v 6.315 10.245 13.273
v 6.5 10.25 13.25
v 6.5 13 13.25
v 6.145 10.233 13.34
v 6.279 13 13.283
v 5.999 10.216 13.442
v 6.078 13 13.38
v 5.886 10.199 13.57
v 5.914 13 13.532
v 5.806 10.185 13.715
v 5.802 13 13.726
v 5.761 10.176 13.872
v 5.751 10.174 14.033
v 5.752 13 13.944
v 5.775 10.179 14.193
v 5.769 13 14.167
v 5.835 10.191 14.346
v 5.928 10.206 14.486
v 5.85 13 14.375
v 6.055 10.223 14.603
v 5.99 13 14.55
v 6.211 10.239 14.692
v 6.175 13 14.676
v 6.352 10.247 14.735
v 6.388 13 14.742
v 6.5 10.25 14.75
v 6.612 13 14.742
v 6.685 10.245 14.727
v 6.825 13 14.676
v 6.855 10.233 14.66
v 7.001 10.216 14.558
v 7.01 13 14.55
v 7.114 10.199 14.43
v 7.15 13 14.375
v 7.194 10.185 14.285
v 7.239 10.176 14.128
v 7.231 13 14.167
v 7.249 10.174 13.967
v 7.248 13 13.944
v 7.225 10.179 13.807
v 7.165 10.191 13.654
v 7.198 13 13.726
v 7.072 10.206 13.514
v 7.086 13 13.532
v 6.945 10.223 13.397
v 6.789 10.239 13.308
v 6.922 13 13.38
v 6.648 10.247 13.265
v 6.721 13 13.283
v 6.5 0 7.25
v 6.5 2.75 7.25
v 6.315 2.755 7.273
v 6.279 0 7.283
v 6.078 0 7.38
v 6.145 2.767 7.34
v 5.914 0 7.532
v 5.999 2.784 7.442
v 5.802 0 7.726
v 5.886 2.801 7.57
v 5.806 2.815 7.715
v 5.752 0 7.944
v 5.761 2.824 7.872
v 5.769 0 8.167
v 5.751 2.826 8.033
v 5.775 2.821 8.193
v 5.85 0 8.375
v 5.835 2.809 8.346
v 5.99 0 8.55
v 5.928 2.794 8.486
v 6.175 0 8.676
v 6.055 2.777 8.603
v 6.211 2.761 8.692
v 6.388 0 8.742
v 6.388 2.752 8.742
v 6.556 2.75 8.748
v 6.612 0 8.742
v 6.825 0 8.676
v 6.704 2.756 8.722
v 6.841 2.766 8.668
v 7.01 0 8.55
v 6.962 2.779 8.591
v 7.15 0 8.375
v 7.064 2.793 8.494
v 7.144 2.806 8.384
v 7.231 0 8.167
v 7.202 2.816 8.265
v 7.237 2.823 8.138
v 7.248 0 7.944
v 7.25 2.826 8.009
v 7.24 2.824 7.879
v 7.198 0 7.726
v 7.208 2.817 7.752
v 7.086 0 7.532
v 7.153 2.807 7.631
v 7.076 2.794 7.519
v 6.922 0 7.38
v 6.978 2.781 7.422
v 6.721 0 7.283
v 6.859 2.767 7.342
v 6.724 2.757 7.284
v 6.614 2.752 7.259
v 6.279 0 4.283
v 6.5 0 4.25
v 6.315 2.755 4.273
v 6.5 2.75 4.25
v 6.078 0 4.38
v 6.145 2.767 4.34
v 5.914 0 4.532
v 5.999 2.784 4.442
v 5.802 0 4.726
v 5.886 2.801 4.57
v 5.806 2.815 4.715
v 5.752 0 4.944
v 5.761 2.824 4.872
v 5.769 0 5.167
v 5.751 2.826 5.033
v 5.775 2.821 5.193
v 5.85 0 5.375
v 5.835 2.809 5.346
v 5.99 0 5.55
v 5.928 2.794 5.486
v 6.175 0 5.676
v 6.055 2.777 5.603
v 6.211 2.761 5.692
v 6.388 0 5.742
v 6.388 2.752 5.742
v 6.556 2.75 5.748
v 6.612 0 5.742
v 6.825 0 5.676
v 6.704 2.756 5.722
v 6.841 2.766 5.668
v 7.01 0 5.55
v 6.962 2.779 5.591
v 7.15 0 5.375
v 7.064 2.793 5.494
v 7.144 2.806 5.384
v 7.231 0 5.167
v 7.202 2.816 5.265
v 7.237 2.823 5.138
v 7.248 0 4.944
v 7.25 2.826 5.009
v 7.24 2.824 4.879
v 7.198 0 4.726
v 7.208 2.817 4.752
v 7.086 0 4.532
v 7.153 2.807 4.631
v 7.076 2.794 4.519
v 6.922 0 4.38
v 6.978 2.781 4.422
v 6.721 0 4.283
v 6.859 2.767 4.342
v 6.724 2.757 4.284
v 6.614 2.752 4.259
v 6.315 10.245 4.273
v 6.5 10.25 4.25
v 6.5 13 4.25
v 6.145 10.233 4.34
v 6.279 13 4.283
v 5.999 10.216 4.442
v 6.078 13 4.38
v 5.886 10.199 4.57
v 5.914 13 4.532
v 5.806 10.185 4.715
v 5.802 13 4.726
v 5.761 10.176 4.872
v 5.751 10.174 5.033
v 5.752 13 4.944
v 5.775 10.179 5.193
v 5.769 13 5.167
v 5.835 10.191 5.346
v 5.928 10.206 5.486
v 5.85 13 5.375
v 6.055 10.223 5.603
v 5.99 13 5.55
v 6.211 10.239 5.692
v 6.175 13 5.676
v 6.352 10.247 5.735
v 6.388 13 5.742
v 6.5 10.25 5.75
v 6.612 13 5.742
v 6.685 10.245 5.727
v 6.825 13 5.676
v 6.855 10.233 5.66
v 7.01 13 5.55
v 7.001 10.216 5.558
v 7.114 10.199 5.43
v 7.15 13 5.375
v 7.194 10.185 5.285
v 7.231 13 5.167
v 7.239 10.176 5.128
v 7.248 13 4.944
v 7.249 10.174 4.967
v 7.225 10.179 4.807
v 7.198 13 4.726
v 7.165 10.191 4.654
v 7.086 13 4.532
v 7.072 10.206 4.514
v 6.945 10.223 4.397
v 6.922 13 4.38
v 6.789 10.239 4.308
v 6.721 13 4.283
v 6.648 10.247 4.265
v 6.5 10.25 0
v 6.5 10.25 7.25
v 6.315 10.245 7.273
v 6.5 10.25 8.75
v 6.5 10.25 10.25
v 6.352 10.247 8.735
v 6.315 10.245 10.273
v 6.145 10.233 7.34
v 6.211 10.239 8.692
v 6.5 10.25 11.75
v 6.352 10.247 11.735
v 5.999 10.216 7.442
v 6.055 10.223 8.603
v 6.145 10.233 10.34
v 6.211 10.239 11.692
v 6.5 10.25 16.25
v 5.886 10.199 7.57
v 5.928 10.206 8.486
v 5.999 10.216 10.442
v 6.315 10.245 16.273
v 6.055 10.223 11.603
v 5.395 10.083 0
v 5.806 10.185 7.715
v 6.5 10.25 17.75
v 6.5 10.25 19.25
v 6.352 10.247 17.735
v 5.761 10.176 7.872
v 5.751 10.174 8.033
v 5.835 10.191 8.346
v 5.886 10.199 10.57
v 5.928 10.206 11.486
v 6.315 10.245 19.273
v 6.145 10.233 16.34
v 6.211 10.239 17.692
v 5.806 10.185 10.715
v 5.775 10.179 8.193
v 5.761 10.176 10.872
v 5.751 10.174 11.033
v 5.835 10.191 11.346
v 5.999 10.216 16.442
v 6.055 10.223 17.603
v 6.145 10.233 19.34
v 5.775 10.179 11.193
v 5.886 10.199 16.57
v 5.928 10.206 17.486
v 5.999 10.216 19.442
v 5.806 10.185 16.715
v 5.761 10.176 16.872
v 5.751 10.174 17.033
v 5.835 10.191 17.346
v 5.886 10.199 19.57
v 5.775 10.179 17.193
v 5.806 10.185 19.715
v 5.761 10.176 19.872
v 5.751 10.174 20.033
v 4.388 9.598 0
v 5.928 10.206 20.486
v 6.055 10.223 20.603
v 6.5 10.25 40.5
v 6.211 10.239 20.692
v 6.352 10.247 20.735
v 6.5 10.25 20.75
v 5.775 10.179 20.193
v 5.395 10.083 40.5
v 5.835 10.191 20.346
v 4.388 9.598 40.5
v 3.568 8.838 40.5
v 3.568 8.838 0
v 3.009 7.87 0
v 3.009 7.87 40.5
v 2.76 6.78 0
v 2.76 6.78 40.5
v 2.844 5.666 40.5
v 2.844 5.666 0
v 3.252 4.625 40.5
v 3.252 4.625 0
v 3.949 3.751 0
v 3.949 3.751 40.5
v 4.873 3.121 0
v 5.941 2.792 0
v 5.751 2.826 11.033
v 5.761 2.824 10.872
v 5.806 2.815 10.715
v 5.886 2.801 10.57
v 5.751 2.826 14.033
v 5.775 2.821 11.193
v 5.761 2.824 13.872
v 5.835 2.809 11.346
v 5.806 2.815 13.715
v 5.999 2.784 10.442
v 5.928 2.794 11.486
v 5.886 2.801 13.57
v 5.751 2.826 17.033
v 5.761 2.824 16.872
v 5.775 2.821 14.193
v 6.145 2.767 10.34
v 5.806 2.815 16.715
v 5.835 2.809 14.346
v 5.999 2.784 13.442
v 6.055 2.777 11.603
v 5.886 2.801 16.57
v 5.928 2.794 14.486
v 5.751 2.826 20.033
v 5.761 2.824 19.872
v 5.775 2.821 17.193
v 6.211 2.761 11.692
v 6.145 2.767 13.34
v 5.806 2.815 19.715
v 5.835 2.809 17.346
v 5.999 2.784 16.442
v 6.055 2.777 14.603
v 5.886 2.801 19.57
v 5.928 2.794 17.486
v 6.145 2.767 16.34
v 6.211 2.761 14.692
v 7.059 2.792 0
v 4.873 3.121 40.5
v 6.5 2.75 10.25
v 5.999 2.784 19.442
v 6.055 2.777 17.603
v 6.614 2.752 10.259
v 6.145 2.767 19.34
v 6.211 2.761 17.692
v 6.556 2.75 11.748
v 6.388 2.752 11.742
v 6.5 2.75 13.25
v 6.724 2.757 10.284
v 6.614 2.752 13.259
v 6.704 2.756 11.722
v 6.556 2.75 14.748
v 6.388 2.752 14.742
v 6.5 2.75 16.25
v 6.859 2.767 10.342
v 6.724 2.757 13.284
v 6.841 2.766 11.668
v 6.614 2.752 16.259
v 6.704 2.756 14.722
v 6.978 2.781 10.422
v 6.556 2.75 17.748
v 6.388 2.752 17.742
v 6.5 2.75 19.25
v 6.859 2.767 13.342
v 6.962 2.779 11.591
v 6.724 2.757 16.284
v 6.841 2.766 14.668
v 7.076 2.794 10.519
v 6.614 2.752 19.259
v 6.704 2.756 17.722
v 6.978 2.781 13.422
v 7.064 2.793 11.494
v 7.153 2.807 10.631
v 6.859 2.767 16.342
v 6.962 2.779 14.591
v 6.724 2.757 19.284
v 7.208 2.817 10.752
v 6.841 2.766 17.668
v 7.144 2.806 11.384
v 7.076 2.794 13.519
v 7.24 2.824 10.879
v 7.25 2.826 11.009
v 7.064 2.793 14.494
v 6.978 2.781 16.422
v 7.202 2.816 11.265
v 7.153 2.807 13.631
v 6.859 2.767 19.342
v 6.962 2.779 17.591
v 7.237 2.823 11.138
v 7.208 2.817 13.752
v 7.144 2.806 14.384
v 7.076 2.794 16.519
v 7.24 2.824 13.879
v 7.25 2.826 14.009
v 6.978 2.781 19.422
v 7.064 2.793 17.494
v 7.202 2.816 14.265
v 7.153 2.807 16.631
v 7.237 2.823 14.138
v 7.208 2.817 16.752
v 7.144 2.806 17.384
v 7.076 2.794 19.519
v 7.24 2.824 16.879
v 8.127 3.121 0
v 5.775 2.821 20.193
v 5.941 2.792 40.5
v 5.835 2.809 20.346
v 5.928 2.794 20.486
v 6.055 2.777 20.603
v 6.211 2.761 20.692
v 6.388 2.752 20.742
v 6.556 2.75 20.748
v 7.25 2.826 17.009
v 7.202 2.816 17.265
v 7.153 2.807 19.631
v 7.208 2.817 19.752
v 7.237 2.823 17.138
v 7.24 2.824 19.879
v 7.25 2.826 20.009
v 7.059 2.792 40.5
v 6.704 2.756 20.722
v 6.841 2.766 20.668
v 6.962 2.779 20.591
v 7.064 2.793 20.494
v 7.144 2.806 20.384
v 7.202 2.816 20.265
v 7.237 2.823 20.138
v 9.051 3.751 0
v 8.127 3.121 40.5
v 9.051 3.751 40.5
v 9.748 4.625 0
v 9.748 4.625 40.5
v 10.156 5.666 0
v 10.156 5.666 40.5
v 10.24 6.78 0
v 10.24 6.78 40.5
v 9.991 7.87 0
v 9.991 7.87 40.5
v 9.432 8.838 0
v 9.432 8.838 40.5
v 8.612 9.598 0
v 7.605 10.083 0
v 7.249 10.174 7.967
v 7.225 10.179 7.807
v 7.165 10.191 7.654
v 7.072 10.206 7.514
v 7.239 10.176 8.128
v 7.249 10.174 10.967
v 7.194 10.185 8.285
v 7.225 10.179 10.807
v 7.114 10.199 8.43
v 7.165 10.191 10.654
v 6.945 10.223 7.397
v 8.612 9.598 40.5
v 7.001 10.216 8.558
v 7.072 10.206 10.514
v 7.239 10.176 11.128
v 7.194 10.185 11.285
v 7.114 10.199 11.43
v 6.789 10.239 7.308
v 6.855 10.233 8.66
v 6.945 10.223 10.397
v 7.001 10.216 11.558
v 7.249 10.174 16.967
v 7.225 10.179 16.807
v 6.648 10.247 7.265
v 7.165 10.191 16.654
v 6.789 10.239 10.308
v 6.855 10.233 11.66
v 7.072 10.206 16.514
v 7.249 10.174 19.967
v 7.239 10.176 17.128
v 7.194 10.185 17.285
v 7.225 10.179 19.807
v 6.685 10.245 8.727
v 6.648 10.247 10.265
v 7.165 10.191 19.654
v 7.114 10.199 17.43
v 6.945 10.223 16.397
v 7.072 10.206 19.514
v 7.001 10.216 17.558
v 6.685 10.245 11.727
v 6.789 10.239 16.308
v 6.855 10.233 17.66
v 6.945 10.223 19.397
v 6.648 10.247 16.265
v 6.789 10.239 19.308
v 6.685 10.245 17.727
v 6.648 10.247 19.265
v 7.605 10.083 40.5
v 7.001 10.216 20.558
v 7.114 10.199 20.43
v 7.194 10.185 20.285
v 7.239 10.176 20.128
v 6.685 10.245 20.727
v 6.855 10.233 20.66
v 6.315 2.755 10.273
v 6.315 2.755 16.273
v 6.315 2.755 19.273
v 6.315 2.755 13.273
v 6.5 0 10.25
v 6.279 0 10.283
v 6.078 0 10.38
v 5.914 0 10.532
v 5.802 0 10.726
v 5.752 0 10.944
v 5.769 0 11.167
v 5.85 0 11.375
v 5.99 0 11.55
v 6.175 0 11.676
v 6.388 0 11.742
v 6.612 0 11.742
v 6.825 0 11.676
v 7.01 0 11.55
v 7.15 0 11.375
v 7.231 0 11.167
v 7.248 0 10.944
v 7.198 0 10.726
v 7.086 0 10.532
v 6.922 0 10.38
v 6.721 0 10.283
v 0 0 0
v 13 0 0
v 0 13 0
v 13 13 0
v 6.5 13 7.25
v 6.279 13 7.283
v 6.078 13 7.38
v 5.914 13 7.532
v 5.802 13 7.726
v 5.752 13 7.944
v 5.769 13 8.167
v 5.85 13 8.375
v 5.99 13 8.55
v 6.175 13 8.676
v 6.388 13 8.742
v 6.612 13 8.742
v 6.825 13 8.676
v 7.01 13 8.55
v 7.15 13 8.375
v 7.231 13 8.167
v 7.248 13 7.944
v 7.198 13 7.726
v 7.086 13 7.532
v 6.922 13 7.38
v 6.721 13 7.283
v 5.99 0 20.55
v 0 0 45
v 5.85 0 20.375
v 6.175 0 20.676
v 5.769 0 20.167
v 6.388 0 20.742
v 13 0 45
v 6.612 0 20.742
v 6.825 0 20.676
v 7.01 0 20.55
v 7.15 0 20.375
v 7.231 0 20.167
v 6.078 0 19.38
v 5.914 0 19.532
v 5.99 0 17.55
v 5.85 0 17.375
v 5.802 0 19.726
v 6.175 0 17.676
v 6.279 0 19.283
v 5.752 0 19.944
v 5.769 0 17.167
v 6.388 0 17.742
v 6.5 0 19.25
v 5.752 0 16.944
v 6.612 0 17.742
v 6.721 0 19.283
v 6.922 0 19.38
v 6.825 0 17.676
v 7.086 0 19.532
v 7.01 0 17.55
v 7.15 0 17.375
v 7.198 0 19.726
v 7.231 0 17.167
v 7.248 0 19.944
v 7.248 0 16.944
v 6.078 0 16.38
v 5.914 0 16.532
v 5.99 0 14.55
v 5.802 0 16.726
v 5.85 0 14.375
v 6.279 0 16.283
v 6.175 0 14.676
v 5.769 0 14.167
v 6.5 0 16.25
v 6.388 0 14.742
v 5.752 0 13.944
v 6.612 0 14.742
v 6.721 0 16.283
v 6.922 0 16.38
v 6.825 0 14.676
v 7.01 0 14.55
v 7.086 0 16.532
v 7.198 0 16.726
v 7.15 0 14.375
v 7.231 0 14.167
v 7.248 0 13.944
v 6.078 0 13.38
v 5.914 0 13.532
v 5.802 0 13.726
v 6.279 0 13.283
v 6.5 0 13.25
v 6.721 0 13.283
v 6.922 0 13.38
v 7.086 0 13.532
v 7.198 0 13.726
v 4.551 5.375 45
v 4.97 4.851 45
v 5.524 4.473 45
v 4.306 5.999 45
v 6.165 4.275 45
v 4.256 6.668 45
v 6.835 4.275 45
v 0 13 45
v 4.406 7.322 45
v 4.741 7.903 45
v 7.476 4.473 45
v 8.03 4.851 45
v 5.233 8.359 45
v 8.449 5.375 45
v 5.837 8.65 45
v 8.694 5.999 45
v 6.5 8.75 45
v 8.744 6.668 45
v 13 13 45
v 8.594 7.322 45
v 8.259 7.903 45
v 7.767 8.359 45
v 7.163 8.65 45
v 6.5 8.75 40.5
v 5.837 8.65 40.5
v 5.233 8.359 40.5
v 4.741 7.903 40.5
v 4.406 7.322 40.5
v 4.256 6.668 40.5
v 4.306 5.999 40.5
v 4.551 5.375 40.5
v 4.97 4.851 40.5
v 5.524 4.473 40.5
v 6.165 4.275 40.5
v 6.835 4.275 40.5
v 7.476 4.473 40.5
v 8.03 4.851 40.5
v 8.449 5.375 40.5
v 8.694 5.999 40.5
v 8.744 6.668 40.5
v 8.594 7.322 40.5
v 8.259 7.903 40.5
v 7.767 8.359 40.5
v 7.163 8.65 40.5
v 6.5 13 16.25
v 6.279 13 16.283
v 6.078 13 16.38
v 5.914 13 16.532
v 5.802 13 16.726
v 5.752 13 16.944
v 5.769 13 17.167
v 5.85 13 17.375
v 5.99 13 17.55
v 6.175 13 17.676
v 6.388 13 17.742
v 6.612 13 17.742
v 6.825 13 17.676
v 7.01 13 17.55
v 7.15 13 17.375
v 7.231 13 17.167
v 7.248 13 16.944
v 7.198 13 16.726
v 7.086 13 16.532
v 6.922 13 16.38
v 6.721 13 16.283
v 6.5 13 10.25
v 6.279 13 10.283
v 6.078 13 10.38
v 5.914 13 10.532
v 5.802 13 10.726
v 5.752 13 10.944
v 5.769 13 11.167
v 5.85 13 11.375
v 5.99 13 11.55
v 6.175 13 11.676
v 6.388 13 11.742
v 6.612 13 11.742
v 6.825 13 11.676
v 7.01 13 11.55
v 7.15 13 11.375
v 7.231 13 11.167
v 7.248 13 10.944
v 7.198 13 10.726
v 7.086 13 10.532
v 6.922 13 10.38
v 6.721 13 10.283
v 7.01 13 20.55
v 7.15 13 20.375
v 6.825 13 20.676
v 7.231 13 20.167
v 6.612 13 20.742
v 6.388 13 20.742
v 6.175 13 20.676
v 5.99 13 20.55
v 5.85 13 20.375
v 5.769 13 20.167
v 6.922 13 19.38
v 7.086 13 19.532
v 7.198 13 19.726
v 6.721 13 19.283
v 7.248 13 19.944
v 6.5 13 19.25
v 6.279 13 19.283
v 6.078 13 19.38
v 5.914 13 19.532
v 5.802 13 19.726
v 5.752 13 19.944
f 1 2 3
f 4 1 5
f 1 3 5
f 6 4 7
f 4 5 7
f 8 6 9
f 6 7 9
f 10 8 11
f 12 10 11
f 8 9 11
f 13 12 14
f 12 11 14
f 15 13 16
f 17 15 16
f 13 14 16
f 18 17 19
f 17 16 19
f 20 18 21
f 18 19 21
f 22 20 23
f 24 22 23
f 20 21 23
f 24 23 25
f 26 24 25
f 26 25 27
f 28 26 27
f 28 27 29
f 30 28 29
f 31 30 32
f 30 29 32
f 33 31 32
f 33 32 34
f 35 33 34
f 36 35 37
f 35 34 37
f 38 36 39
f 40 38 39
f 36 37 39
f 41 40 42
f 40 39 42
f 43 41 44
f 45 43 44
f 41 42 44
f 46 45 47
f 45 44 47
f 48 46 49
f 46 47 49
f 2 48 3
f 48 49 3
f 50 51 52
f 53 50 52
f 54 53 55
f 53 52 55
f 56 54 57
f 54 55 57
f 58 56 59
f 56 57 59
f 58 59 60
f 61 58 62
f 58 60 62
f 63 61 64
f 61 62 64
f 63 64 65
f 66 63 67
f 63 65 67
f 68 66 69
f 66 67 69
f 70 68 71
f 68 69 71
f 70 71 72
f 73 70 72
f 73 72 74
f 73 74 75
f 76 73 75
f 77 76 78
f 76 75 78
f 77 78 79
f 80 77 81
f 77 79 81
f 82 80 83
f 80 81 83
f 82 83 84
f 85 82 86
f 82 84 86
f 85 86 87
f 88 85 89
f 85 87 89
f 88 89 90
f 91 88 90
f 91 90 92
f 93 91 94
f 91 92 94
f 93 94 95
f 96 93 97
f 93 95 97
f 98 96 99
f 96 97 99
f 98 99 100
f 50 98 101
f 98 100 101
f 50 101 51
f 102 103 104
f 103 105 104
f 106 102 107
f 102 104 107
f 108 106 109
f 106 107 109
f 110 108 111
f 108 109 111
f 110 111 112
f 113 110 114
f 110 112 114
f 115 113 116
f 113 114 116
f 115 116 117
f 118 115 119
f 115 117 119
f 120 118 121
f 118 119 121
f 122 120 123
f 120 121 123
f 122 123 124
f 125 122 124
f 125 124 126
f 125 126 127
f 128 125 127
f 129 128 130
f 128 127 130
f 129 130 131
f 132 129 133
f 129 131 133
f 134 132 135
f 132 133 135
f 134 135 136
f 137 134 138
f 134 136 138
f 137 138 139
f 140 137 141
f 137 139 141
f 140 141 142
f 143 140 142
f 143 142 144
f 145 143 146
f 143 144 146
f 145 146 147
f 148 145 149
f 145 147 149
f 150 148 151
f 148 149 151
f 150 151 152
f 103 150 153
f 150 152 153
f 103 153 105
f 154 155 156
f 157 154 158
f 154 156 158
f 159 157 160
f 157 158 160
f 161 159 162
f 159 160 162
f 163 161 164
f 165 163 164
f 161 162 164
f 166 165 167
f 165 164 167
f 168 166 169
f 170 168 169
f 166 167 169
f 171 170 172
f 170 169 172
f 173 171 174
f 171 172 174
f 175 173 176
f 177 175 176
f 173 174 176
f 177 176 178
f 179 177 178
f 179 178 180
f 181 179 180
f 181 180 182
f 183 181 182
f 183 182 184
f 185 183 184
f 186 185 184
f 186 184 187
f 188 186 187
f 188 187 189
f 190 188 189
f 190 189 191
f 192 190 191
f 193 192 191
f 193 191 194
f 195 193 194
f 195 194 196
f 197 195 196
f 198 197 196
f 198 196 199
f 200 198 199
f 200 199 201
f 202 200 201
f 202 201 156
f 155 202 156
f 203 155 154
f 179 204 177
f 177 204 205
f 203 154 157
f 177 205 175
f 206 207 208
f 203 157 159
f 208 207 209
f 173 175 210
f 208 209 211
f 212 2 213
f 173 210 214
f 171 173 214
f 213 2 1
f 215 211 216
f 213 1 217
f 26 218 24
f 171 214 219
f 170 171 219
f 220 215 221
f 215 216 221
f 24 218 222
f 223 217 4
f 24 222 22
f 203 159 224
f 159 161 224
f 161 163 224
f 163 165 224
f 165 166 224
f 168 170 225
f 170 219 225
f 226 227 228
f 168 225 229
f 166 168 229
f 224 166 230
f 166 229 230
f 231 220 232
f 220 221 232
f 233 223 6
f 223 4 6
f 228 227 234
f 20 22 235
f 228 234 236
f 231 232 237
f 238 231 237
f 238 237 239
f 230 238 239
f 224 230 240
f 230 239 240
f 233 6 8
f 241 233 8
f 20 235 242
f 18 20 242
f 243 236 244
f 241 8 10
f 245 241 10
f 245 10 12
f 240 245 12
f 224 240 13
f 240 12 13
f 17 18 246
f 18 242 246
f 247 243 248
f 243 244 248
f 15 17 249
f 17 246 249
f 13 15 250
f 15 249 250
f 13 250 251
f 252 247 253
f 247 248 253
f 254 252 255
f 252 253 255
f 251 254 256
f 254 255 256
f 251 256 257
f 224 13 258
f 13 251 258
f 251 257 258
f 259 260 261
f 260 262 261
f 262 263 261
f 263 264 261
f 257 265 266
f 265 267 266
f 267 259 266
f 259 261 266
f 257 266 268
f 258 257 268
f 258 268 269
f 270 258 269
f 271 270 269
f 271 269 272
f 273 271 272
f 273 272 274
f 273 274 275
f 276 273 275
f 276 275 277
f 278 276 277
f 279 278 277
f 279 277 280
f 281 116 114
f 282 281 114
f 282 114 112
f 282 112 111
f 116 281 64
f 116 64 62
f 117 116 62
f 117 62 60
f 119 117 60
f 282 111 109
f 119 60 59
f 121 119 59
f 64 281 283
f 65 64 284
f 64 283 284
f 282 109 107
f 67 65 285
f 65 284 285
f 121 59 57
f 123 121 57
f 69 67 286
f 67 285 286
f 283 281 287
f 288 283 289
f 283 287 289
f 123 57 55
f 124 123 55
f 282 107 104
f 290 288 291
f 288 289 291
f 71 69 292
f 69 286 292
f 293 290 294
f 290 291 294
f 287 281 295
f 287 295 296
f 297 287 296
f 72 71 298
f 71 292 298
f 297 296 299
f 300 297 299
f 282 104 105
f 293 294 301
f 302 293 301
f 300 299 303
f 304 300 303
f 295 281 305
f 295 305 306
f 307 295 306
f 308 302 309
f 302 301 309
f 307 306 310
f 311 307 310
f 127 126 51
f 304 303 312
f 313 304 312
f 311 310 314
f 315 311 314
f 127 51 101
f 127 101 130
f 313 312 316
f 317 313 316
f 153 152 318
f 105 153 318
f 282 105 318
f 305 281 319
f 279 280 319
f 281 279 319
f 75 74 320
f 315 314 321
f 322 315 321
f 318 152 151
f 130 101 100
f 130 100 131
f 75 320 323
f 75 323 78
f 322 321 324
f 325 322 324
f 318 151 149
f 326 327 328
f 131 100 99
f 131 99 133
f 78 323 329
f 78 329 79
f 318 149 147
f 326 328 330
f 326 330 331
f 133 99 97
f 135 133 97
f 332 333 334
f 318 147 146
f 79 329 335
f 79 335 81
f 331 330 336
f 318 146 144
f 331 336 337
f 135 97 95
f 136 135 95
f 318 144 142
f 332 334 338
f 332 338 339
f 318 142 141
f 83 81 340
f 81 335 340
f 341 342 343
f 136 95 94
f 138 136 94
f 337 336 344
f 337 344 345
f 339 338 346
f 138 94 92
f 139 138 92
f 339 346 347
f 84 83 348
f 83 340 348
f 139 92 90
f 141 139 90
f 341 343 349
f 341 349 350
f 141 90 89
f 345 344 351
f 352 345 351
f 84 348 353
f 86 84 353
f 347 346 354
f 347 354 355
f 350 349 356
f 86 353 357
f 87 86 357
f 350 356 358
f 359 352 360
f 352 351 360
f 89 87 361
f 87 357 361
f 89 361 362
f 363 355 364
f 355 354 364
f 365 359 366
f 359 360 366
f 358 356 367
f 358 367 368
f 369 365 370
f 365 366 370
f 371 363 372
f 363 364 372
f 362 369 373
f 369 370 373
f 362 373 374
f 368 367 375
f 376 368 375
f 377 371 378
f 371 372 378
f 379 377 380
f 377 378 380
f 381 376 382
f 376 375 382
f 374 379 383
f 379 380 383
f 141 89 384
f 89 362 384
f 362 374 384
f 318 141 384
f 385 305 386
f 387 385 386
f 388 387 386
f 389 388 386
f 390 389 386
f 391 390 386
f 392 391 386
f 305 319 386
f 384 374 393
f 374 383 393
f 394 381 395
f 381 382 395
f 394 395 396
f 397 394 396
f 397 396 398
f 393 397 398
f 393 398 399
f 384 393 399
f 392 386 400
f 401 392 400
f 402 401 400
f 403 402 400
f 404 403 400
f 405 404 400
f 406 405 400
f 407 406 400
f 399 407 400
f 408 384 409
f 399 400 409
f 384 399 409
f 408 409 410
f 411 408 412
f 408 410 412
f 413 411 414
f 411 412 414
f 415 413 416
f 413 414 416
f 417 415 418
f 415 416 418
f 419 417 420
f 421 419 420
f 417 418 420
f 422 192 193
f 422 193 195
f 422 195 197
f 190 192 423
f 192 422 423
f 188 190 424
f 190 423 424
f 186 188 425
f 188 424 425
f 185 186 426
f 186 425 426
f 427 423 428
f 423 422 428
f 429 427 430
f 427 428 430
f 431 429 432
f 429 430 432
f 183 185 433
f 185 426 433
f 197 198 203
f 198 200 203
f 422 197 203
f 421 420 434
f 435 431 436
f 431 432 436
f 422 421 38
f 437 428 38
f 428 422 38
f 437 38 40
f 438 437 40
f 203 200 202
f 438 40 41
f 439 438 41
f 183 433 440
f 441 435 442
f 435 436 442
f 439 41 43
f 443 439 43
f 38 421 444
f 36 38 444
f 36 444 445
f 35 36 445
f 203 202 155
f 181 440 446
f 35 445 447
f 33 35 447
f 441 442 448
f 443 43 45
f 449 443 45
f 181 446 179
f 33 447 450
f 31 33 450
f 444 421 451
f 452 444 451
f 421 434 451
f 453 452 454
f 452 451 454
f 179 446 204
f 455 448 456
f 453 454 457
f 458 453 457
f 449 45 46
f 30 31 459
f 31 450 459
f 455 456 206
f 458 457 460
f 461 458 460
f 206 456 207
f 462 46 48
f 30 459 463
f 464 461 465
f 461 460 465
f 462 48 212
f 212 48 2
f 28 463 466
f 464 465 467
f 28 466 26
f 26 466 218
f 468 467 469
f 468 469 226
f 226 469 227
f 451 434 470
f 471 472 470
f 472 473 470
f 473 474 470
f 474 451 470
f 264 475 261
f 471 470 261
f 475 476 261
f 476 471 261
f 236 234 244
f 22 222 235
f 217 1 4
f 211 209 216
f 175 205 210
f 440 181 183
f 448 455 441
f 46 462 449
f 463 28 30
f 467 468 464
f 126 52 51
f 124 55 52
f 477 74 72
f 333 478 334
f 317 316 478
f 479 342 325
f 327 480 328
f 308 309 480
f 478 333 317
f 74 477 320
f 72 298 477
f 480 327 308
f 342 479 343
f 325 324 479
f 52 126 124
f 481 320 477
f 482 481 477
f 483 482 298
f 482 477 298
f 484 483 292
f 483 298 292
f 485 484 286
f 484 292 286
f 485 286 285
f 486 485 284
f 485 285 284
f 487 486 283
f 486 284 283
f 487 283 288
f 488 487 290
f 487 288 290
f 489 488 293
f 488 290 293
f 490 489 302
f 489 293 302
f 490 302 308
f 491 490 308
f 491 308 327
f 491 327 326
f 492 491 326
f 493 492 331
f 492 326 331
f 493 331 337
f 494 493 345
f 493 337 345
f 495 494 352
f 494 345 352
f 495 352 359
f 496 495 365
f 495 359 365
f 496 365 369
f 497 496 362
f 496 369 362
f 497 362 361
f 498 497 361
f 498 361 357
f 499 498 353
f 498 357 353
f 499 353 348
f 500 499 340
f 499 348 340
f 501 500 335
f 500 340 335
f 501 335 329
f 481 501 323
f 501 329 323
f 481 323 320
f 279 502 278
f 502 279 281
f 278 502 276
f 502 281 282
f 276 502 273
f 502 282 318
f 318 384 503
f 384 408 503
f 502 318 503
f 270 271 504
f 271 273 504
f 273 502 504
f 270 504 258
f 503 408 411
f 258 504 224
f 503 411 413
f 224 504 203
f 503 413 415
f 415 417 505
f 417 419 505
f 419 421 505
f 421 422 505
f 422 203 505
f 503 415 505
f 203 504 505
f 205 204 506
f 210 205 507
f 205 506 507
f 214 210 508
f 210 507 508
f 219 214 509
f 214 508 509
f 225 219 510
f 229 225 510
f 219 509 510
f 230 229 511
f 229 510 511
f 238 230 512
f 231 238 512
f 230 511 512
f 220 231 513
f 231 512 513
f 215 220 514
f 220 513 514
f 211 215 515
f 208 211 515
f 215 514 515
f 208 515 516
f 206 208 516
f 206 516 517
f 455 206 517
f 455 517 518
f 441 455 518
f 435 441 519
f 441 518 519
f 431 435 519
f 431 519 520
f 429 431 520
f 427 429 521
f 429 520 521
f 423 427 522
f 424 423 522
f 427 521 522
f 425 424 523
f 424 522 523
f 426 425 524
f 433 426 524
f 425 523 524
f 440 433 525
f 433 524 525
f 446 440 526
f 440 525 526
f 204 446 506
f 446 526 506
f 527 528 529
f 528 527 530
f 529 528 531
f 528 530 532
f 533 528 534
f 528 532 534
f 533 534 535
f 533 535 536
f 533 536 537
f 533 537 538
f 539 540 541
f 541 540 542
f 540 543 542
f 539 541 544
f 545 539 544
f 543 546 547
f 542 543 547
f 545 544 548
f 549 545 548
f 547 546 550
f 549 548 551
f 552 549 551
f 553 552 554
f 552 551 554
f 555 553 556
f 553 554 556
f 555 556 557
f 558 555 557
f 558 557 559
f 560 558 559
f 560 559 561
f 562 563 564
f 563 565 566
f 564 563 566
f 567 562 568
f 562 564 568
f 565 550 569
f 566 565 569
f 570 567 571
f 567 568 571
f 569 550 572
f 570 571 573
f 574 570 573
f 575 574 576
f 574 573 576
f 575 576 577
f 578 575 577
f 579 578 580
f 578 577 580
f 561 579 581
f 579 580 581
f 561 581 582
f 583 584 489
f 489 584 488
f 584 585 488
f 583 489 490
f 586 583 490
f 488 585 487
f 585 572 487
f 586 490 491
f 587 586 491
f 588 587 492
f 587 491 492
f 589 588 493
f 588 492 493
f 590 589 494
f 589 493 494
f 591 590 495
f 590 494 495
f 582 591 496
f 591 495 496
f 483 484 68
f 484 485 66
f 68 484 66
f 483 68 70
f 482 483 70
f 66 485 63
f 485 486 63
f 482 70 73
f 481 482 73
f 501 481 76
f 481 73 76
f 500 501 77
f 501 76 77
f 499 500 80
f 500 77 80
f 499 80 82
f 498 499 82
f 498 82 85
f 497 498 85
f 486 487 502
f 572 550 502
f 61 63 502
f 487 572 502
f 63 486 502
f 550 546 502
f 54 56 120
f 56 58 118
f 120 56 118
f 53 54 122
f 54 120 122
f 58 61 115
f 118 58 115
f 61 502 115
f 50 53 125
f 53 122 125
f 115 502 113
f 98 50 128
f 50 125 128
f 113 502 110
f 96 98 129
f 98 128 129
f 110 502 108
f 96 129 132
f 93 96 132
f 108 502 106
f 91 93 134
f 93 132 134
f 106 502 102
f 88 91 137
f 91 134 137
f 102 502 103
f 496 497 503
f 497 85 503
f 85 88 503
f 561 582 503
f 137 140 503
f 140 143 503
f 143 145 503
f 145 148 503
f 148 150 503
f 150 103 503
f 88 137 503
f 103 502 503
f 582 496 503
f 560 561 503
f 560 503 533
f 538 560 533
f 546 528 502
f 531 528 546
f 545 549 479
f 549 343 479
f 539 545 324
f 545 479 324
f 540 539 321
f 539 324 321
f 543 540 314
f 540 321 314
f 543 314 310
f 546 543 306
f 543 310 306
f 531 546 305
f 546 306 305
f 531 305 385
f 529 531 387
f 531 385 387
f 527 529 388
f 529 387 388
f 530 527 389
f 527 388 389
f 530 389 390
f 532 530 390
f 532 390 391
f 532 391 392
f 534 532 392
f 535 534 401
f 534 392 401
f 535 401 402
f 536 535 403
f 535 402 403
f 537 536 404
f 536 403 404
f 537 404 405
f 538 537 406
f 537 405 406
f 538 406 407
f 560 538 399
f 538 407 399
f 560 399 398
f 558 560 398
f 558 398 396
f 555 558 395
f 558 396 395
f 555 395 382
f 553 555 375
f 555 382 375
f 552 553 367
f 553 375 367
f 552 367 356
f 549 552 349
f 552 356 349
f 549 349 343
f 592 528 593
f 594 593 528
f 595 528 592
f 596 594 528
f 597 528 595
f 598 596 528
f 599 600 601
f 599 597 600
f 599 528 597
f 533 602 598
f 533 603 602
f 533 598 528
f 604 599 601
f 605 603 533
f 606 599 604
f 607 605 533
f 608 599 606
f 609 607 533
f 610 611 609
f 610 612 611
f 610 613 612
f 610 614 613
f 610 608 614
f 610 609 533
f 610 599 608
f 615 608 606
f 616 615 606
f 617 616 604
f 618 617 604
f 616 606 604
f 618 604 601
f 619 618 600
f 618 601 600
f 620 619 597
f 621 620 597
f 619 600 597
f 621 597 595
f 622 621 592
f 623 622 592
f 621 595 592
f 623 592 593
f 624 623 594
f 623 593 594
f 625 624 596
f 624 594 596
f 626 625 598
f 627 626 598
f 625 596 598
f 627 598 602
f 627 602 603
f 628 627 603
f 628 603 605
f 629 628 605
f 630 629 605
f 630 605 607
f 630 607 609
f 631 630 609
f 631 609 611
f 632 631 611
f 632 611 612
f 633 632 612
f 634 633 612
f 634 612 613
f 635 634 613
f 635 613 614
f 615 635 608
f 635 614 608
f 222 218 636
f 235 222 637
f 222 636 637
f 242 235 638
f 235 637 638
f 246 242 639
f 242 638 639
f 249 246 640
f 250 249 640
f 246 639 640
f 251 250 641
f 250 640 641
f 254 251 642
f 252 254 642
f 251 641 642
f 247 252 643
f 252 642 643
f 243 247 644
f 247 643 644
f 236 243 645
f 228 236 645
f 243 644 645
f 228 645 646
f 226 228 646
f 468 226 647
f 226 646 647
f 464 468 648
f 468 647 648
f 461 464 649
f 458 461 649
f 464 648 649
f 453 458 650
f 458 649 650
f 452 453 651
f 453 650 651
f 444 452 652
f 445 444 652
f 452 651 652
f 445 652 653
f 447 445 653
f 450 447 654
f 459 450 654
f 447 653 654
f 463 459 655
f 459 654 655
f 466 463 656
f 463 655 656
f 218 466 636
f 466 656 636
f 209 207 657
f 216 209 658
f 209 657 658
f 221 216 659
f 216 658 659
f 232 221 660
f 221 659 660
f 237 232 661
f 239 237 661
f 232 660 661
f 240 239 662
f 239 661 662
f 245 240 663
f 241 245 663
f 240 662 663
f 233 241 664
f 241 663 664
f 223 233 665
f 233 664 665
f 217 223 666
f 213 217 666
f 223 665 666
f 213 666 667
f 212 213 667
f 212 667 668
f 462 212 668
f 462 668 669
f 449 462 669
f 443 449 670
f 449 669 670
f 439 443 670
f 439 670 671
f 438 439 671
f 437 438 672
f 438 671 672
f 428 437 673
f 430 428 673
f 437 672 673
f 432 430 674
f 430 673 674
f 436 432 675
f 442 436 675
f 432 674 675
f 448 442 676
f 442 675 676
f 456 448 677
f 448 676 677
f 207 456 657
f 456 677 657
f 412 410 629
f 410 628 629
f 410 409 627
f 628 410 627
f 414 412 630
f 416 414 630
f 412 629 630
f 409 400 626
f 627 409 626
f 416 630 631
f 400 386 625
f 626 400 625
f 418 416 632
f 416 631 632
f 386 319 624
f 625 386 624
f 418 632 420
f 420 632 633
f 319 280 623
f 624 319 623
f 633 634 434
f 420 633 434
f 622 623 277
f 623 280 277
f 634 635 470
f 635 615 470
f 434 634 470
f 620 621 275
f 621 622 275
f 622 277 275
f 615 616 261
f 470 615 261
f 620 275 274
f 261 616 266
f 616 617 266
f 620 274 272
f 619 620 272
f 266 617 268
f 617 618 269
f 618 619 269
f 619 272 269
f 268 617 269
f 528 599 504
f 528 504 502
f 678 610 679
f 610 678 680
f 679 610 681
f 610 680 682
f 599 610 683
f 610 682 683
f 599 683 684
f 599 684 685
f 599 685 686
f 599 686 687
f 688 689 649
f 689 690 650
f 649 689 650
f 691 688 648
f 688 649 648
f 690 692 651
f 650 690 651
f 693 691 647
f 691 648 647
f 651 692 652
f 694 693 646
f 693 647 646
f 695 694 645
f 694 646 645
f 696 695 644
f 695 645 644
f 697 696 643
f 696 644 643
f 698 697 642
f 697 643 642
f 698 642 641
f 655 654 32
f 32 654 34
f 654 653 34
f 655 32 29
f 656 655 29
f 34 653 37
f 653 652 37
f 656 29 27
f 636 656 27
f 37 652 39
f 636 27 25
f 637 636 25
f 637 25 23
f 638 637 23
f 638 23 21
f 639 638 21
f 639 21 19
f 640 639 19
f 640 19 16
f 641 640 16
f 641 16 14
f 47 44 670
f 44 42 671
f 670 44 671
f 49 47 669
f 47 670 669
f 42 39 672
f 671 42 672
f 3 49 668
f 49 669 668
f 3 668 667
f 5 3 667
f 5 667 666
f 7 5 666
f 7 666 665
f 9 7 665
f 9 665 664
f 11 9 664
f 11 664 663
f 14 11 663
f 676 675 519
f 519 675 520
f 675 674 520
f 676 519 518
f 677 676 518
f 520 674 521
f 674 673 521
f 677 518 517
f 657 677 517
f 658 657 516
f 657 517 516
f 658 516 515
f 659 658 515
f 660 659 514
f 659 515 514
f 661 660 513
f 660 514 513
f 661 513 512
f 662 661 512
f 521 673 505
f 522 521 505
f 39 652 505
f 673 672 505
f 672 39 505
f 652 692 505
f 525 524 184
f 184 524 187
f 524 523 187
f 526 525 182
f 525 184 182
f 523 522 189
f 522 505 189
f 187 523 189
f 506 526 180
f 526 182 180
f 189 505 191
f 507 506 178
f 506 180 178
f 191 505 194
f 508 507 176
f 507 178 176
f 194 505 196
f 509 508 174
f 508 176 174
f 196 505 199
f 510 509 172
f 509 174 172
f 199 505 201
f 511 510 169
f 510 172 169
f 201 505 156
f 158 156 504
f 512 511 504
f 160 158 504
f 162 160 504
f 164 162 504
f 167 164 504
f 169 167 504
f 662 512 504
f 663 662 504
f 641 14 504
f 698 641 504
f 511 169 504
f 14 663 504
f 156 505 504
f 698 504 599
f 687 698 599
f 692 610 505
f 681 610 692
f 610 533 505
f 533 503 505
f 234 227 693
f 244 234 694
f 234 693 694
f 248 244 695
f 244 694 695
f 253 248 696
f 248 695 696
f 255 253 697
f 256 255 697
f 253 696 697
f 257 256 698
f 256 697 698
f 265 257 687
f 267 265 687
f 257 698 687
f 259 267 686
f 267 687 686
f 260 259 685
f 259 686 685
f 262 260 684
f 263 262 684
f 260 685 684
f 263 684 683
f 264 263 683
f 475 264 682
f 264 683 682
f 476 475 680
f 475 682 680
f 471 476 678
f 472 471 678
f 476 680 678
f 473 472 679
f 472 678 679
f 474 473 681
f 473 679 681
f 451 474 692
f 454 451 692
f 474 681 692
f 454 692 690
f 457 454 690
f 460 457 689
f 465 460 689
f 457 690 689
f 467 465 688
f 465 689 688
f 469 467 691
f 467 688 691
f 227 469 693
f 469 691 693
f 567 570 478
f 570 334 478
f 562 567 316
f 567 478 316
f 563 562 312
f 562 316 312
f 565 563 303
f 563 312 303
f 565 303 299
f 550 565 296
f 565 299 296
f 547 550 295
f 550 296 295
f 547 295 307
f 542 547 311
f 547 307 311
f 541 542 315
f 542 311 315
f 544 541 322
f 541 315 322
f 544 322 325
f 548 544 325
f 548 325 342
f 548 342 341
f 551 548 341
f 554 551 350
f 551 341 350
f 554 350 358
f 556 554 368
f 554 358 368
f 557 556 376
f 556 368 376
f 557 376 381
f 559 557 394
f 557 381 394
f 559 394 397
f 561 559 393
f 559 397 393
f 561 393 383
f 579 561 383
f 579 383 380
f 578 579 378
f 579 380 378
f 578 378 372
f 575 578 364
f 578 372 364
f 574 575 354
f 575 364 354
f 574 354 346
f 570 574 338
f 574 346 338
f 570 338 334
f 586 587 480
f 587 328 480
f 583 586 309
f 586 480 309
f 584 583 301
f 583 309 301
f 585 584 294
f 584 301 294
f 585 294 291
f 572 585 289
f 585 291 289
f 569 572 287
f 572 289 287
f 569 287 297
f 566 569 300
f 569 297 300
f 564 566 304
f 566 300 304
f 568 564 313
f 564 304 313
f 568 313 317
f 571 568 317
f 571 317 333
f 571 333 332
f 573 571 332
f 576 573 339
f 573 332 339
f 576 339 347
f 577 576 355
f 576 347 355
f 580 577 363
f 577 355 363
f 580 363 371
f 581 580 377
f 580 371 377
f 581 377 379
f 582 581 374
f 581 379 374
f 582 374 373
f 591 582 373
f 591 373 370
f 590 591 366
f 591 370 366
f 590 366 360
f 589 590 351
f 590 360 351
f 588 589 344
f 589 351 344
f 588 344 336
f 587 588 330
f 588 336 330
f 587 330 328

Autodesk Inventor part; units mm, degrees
ref_plane "YZ Plane" through (0, 0, 0) normal (1, 0, 0) x (0, 1, 0)
ref_plane "XZ Plane" through (0, 0, 0) normal (0, 1, 0) x (-1, 0, 0)
ref_plane "XY Plane" through (0, 0, 0) normal (0, 0, 1) x (1, 0, 0)
sketch "Sketch1" plane through (0, 0, 0) normal (0, 0, 1) x (1, 0, 0)
  line L0 (0, 0) -> (13, 0)
  line L1 (13, 0) -> (13, 13)
  line L2 (13, 13) -> (0, 13)
  line L3 (0, 13) -> (0, 0)
  dimension "d0" = 13
  dimension "d1" = 13
extrude "Extrusion1" add sketch "Sketch1" along normal blind 45
sketch "Sketch2" plane through (0, 0, 0) normal (0, 0, -1) x (-1, 0, 0)
  circle A0 centre (-6.5, 6.5) radius 3.75
  line L0 (0, 13) -> (0, 0) projected
  line L1 (0, 0) -> (-13, 0) projected
  dimension "d4" = 7.5
  dimension "d5" = 6.5
  dimension "d6" = 6.5
hole "Hole1" at (6.5, 6.5, 0) direction (0, 0, 1) diameter 4.5 end through all counterbore diameter 7.5 counterbore depth 40.5
sketch "Sketch3" plane through (0, 0, 0) normal (0, -1, 0) x (1, 0, 0)
  circle A0 centre (6.5, 5) radius 1
  line L0 (13, 0) -> (13, 45) projected
  line L1 (0, 0) -> (13, 0) projected
  circle A1 centre (6.5, 8) radius 1
  circle A2 centre (6.5, 11) radius 1
  circle A3 centre (6.5, 14) radius 1
  circle A4 centre (6.5, 17) radius 1
  circle A5 centre (6.5, 20) radius 1
  dimension "d14" = 2
  dimension "d15" = 6.5
  dimension "d16" = 5
  dimension "d17" = 2
  dimension "d18" = 3
  dimension "d19" = 6.5
  dimension "d20" = 2
  dimension "d21" = 3
  dimension "d22" = 6.5
  dimension "d23" = 2
  dimension "d24" = 3
  dimension "d25" = 6.5
  dimension "d26" = 2
  dimension "d27" = 3
  dimension "d28" = 2
  dimension "d29" = 3
  dimension "d30" = 6.5
hole "Hole2" at (6.5, 0, 5) at (6.5, 0, 8) at (6.5, 0, 11) at (6.5, 0, 14) at (6.5, 0, 17) at (6.5, 0, 20) direction (0, 1, 0) diameter 1.5 end through all
equation "\"d12\" = Thickness"
equation "\"d36\" = Thickness"
equation "\"BendRadius\" = Thickness"
equation "\"BendReliefWidth\" = Thickness"
equation "\"BendReliefDepth\" = 0.5 * Thickness"
equation "\"CornerReliefSize\" = 4 * Thickness"
equation "\"MinimumRemnant\" = 2 * Thickness"
equation "\"TransitionRadius\" = BendRadius"
equation "\"JacobiRadiusSize\" = BendRadius"
equation "\"GapSize\" = Thickness"
equation "\"Thickness\" = 0.5"
properties part number "male_long_part2_9_2018" material "Acetal Resin, Black"
